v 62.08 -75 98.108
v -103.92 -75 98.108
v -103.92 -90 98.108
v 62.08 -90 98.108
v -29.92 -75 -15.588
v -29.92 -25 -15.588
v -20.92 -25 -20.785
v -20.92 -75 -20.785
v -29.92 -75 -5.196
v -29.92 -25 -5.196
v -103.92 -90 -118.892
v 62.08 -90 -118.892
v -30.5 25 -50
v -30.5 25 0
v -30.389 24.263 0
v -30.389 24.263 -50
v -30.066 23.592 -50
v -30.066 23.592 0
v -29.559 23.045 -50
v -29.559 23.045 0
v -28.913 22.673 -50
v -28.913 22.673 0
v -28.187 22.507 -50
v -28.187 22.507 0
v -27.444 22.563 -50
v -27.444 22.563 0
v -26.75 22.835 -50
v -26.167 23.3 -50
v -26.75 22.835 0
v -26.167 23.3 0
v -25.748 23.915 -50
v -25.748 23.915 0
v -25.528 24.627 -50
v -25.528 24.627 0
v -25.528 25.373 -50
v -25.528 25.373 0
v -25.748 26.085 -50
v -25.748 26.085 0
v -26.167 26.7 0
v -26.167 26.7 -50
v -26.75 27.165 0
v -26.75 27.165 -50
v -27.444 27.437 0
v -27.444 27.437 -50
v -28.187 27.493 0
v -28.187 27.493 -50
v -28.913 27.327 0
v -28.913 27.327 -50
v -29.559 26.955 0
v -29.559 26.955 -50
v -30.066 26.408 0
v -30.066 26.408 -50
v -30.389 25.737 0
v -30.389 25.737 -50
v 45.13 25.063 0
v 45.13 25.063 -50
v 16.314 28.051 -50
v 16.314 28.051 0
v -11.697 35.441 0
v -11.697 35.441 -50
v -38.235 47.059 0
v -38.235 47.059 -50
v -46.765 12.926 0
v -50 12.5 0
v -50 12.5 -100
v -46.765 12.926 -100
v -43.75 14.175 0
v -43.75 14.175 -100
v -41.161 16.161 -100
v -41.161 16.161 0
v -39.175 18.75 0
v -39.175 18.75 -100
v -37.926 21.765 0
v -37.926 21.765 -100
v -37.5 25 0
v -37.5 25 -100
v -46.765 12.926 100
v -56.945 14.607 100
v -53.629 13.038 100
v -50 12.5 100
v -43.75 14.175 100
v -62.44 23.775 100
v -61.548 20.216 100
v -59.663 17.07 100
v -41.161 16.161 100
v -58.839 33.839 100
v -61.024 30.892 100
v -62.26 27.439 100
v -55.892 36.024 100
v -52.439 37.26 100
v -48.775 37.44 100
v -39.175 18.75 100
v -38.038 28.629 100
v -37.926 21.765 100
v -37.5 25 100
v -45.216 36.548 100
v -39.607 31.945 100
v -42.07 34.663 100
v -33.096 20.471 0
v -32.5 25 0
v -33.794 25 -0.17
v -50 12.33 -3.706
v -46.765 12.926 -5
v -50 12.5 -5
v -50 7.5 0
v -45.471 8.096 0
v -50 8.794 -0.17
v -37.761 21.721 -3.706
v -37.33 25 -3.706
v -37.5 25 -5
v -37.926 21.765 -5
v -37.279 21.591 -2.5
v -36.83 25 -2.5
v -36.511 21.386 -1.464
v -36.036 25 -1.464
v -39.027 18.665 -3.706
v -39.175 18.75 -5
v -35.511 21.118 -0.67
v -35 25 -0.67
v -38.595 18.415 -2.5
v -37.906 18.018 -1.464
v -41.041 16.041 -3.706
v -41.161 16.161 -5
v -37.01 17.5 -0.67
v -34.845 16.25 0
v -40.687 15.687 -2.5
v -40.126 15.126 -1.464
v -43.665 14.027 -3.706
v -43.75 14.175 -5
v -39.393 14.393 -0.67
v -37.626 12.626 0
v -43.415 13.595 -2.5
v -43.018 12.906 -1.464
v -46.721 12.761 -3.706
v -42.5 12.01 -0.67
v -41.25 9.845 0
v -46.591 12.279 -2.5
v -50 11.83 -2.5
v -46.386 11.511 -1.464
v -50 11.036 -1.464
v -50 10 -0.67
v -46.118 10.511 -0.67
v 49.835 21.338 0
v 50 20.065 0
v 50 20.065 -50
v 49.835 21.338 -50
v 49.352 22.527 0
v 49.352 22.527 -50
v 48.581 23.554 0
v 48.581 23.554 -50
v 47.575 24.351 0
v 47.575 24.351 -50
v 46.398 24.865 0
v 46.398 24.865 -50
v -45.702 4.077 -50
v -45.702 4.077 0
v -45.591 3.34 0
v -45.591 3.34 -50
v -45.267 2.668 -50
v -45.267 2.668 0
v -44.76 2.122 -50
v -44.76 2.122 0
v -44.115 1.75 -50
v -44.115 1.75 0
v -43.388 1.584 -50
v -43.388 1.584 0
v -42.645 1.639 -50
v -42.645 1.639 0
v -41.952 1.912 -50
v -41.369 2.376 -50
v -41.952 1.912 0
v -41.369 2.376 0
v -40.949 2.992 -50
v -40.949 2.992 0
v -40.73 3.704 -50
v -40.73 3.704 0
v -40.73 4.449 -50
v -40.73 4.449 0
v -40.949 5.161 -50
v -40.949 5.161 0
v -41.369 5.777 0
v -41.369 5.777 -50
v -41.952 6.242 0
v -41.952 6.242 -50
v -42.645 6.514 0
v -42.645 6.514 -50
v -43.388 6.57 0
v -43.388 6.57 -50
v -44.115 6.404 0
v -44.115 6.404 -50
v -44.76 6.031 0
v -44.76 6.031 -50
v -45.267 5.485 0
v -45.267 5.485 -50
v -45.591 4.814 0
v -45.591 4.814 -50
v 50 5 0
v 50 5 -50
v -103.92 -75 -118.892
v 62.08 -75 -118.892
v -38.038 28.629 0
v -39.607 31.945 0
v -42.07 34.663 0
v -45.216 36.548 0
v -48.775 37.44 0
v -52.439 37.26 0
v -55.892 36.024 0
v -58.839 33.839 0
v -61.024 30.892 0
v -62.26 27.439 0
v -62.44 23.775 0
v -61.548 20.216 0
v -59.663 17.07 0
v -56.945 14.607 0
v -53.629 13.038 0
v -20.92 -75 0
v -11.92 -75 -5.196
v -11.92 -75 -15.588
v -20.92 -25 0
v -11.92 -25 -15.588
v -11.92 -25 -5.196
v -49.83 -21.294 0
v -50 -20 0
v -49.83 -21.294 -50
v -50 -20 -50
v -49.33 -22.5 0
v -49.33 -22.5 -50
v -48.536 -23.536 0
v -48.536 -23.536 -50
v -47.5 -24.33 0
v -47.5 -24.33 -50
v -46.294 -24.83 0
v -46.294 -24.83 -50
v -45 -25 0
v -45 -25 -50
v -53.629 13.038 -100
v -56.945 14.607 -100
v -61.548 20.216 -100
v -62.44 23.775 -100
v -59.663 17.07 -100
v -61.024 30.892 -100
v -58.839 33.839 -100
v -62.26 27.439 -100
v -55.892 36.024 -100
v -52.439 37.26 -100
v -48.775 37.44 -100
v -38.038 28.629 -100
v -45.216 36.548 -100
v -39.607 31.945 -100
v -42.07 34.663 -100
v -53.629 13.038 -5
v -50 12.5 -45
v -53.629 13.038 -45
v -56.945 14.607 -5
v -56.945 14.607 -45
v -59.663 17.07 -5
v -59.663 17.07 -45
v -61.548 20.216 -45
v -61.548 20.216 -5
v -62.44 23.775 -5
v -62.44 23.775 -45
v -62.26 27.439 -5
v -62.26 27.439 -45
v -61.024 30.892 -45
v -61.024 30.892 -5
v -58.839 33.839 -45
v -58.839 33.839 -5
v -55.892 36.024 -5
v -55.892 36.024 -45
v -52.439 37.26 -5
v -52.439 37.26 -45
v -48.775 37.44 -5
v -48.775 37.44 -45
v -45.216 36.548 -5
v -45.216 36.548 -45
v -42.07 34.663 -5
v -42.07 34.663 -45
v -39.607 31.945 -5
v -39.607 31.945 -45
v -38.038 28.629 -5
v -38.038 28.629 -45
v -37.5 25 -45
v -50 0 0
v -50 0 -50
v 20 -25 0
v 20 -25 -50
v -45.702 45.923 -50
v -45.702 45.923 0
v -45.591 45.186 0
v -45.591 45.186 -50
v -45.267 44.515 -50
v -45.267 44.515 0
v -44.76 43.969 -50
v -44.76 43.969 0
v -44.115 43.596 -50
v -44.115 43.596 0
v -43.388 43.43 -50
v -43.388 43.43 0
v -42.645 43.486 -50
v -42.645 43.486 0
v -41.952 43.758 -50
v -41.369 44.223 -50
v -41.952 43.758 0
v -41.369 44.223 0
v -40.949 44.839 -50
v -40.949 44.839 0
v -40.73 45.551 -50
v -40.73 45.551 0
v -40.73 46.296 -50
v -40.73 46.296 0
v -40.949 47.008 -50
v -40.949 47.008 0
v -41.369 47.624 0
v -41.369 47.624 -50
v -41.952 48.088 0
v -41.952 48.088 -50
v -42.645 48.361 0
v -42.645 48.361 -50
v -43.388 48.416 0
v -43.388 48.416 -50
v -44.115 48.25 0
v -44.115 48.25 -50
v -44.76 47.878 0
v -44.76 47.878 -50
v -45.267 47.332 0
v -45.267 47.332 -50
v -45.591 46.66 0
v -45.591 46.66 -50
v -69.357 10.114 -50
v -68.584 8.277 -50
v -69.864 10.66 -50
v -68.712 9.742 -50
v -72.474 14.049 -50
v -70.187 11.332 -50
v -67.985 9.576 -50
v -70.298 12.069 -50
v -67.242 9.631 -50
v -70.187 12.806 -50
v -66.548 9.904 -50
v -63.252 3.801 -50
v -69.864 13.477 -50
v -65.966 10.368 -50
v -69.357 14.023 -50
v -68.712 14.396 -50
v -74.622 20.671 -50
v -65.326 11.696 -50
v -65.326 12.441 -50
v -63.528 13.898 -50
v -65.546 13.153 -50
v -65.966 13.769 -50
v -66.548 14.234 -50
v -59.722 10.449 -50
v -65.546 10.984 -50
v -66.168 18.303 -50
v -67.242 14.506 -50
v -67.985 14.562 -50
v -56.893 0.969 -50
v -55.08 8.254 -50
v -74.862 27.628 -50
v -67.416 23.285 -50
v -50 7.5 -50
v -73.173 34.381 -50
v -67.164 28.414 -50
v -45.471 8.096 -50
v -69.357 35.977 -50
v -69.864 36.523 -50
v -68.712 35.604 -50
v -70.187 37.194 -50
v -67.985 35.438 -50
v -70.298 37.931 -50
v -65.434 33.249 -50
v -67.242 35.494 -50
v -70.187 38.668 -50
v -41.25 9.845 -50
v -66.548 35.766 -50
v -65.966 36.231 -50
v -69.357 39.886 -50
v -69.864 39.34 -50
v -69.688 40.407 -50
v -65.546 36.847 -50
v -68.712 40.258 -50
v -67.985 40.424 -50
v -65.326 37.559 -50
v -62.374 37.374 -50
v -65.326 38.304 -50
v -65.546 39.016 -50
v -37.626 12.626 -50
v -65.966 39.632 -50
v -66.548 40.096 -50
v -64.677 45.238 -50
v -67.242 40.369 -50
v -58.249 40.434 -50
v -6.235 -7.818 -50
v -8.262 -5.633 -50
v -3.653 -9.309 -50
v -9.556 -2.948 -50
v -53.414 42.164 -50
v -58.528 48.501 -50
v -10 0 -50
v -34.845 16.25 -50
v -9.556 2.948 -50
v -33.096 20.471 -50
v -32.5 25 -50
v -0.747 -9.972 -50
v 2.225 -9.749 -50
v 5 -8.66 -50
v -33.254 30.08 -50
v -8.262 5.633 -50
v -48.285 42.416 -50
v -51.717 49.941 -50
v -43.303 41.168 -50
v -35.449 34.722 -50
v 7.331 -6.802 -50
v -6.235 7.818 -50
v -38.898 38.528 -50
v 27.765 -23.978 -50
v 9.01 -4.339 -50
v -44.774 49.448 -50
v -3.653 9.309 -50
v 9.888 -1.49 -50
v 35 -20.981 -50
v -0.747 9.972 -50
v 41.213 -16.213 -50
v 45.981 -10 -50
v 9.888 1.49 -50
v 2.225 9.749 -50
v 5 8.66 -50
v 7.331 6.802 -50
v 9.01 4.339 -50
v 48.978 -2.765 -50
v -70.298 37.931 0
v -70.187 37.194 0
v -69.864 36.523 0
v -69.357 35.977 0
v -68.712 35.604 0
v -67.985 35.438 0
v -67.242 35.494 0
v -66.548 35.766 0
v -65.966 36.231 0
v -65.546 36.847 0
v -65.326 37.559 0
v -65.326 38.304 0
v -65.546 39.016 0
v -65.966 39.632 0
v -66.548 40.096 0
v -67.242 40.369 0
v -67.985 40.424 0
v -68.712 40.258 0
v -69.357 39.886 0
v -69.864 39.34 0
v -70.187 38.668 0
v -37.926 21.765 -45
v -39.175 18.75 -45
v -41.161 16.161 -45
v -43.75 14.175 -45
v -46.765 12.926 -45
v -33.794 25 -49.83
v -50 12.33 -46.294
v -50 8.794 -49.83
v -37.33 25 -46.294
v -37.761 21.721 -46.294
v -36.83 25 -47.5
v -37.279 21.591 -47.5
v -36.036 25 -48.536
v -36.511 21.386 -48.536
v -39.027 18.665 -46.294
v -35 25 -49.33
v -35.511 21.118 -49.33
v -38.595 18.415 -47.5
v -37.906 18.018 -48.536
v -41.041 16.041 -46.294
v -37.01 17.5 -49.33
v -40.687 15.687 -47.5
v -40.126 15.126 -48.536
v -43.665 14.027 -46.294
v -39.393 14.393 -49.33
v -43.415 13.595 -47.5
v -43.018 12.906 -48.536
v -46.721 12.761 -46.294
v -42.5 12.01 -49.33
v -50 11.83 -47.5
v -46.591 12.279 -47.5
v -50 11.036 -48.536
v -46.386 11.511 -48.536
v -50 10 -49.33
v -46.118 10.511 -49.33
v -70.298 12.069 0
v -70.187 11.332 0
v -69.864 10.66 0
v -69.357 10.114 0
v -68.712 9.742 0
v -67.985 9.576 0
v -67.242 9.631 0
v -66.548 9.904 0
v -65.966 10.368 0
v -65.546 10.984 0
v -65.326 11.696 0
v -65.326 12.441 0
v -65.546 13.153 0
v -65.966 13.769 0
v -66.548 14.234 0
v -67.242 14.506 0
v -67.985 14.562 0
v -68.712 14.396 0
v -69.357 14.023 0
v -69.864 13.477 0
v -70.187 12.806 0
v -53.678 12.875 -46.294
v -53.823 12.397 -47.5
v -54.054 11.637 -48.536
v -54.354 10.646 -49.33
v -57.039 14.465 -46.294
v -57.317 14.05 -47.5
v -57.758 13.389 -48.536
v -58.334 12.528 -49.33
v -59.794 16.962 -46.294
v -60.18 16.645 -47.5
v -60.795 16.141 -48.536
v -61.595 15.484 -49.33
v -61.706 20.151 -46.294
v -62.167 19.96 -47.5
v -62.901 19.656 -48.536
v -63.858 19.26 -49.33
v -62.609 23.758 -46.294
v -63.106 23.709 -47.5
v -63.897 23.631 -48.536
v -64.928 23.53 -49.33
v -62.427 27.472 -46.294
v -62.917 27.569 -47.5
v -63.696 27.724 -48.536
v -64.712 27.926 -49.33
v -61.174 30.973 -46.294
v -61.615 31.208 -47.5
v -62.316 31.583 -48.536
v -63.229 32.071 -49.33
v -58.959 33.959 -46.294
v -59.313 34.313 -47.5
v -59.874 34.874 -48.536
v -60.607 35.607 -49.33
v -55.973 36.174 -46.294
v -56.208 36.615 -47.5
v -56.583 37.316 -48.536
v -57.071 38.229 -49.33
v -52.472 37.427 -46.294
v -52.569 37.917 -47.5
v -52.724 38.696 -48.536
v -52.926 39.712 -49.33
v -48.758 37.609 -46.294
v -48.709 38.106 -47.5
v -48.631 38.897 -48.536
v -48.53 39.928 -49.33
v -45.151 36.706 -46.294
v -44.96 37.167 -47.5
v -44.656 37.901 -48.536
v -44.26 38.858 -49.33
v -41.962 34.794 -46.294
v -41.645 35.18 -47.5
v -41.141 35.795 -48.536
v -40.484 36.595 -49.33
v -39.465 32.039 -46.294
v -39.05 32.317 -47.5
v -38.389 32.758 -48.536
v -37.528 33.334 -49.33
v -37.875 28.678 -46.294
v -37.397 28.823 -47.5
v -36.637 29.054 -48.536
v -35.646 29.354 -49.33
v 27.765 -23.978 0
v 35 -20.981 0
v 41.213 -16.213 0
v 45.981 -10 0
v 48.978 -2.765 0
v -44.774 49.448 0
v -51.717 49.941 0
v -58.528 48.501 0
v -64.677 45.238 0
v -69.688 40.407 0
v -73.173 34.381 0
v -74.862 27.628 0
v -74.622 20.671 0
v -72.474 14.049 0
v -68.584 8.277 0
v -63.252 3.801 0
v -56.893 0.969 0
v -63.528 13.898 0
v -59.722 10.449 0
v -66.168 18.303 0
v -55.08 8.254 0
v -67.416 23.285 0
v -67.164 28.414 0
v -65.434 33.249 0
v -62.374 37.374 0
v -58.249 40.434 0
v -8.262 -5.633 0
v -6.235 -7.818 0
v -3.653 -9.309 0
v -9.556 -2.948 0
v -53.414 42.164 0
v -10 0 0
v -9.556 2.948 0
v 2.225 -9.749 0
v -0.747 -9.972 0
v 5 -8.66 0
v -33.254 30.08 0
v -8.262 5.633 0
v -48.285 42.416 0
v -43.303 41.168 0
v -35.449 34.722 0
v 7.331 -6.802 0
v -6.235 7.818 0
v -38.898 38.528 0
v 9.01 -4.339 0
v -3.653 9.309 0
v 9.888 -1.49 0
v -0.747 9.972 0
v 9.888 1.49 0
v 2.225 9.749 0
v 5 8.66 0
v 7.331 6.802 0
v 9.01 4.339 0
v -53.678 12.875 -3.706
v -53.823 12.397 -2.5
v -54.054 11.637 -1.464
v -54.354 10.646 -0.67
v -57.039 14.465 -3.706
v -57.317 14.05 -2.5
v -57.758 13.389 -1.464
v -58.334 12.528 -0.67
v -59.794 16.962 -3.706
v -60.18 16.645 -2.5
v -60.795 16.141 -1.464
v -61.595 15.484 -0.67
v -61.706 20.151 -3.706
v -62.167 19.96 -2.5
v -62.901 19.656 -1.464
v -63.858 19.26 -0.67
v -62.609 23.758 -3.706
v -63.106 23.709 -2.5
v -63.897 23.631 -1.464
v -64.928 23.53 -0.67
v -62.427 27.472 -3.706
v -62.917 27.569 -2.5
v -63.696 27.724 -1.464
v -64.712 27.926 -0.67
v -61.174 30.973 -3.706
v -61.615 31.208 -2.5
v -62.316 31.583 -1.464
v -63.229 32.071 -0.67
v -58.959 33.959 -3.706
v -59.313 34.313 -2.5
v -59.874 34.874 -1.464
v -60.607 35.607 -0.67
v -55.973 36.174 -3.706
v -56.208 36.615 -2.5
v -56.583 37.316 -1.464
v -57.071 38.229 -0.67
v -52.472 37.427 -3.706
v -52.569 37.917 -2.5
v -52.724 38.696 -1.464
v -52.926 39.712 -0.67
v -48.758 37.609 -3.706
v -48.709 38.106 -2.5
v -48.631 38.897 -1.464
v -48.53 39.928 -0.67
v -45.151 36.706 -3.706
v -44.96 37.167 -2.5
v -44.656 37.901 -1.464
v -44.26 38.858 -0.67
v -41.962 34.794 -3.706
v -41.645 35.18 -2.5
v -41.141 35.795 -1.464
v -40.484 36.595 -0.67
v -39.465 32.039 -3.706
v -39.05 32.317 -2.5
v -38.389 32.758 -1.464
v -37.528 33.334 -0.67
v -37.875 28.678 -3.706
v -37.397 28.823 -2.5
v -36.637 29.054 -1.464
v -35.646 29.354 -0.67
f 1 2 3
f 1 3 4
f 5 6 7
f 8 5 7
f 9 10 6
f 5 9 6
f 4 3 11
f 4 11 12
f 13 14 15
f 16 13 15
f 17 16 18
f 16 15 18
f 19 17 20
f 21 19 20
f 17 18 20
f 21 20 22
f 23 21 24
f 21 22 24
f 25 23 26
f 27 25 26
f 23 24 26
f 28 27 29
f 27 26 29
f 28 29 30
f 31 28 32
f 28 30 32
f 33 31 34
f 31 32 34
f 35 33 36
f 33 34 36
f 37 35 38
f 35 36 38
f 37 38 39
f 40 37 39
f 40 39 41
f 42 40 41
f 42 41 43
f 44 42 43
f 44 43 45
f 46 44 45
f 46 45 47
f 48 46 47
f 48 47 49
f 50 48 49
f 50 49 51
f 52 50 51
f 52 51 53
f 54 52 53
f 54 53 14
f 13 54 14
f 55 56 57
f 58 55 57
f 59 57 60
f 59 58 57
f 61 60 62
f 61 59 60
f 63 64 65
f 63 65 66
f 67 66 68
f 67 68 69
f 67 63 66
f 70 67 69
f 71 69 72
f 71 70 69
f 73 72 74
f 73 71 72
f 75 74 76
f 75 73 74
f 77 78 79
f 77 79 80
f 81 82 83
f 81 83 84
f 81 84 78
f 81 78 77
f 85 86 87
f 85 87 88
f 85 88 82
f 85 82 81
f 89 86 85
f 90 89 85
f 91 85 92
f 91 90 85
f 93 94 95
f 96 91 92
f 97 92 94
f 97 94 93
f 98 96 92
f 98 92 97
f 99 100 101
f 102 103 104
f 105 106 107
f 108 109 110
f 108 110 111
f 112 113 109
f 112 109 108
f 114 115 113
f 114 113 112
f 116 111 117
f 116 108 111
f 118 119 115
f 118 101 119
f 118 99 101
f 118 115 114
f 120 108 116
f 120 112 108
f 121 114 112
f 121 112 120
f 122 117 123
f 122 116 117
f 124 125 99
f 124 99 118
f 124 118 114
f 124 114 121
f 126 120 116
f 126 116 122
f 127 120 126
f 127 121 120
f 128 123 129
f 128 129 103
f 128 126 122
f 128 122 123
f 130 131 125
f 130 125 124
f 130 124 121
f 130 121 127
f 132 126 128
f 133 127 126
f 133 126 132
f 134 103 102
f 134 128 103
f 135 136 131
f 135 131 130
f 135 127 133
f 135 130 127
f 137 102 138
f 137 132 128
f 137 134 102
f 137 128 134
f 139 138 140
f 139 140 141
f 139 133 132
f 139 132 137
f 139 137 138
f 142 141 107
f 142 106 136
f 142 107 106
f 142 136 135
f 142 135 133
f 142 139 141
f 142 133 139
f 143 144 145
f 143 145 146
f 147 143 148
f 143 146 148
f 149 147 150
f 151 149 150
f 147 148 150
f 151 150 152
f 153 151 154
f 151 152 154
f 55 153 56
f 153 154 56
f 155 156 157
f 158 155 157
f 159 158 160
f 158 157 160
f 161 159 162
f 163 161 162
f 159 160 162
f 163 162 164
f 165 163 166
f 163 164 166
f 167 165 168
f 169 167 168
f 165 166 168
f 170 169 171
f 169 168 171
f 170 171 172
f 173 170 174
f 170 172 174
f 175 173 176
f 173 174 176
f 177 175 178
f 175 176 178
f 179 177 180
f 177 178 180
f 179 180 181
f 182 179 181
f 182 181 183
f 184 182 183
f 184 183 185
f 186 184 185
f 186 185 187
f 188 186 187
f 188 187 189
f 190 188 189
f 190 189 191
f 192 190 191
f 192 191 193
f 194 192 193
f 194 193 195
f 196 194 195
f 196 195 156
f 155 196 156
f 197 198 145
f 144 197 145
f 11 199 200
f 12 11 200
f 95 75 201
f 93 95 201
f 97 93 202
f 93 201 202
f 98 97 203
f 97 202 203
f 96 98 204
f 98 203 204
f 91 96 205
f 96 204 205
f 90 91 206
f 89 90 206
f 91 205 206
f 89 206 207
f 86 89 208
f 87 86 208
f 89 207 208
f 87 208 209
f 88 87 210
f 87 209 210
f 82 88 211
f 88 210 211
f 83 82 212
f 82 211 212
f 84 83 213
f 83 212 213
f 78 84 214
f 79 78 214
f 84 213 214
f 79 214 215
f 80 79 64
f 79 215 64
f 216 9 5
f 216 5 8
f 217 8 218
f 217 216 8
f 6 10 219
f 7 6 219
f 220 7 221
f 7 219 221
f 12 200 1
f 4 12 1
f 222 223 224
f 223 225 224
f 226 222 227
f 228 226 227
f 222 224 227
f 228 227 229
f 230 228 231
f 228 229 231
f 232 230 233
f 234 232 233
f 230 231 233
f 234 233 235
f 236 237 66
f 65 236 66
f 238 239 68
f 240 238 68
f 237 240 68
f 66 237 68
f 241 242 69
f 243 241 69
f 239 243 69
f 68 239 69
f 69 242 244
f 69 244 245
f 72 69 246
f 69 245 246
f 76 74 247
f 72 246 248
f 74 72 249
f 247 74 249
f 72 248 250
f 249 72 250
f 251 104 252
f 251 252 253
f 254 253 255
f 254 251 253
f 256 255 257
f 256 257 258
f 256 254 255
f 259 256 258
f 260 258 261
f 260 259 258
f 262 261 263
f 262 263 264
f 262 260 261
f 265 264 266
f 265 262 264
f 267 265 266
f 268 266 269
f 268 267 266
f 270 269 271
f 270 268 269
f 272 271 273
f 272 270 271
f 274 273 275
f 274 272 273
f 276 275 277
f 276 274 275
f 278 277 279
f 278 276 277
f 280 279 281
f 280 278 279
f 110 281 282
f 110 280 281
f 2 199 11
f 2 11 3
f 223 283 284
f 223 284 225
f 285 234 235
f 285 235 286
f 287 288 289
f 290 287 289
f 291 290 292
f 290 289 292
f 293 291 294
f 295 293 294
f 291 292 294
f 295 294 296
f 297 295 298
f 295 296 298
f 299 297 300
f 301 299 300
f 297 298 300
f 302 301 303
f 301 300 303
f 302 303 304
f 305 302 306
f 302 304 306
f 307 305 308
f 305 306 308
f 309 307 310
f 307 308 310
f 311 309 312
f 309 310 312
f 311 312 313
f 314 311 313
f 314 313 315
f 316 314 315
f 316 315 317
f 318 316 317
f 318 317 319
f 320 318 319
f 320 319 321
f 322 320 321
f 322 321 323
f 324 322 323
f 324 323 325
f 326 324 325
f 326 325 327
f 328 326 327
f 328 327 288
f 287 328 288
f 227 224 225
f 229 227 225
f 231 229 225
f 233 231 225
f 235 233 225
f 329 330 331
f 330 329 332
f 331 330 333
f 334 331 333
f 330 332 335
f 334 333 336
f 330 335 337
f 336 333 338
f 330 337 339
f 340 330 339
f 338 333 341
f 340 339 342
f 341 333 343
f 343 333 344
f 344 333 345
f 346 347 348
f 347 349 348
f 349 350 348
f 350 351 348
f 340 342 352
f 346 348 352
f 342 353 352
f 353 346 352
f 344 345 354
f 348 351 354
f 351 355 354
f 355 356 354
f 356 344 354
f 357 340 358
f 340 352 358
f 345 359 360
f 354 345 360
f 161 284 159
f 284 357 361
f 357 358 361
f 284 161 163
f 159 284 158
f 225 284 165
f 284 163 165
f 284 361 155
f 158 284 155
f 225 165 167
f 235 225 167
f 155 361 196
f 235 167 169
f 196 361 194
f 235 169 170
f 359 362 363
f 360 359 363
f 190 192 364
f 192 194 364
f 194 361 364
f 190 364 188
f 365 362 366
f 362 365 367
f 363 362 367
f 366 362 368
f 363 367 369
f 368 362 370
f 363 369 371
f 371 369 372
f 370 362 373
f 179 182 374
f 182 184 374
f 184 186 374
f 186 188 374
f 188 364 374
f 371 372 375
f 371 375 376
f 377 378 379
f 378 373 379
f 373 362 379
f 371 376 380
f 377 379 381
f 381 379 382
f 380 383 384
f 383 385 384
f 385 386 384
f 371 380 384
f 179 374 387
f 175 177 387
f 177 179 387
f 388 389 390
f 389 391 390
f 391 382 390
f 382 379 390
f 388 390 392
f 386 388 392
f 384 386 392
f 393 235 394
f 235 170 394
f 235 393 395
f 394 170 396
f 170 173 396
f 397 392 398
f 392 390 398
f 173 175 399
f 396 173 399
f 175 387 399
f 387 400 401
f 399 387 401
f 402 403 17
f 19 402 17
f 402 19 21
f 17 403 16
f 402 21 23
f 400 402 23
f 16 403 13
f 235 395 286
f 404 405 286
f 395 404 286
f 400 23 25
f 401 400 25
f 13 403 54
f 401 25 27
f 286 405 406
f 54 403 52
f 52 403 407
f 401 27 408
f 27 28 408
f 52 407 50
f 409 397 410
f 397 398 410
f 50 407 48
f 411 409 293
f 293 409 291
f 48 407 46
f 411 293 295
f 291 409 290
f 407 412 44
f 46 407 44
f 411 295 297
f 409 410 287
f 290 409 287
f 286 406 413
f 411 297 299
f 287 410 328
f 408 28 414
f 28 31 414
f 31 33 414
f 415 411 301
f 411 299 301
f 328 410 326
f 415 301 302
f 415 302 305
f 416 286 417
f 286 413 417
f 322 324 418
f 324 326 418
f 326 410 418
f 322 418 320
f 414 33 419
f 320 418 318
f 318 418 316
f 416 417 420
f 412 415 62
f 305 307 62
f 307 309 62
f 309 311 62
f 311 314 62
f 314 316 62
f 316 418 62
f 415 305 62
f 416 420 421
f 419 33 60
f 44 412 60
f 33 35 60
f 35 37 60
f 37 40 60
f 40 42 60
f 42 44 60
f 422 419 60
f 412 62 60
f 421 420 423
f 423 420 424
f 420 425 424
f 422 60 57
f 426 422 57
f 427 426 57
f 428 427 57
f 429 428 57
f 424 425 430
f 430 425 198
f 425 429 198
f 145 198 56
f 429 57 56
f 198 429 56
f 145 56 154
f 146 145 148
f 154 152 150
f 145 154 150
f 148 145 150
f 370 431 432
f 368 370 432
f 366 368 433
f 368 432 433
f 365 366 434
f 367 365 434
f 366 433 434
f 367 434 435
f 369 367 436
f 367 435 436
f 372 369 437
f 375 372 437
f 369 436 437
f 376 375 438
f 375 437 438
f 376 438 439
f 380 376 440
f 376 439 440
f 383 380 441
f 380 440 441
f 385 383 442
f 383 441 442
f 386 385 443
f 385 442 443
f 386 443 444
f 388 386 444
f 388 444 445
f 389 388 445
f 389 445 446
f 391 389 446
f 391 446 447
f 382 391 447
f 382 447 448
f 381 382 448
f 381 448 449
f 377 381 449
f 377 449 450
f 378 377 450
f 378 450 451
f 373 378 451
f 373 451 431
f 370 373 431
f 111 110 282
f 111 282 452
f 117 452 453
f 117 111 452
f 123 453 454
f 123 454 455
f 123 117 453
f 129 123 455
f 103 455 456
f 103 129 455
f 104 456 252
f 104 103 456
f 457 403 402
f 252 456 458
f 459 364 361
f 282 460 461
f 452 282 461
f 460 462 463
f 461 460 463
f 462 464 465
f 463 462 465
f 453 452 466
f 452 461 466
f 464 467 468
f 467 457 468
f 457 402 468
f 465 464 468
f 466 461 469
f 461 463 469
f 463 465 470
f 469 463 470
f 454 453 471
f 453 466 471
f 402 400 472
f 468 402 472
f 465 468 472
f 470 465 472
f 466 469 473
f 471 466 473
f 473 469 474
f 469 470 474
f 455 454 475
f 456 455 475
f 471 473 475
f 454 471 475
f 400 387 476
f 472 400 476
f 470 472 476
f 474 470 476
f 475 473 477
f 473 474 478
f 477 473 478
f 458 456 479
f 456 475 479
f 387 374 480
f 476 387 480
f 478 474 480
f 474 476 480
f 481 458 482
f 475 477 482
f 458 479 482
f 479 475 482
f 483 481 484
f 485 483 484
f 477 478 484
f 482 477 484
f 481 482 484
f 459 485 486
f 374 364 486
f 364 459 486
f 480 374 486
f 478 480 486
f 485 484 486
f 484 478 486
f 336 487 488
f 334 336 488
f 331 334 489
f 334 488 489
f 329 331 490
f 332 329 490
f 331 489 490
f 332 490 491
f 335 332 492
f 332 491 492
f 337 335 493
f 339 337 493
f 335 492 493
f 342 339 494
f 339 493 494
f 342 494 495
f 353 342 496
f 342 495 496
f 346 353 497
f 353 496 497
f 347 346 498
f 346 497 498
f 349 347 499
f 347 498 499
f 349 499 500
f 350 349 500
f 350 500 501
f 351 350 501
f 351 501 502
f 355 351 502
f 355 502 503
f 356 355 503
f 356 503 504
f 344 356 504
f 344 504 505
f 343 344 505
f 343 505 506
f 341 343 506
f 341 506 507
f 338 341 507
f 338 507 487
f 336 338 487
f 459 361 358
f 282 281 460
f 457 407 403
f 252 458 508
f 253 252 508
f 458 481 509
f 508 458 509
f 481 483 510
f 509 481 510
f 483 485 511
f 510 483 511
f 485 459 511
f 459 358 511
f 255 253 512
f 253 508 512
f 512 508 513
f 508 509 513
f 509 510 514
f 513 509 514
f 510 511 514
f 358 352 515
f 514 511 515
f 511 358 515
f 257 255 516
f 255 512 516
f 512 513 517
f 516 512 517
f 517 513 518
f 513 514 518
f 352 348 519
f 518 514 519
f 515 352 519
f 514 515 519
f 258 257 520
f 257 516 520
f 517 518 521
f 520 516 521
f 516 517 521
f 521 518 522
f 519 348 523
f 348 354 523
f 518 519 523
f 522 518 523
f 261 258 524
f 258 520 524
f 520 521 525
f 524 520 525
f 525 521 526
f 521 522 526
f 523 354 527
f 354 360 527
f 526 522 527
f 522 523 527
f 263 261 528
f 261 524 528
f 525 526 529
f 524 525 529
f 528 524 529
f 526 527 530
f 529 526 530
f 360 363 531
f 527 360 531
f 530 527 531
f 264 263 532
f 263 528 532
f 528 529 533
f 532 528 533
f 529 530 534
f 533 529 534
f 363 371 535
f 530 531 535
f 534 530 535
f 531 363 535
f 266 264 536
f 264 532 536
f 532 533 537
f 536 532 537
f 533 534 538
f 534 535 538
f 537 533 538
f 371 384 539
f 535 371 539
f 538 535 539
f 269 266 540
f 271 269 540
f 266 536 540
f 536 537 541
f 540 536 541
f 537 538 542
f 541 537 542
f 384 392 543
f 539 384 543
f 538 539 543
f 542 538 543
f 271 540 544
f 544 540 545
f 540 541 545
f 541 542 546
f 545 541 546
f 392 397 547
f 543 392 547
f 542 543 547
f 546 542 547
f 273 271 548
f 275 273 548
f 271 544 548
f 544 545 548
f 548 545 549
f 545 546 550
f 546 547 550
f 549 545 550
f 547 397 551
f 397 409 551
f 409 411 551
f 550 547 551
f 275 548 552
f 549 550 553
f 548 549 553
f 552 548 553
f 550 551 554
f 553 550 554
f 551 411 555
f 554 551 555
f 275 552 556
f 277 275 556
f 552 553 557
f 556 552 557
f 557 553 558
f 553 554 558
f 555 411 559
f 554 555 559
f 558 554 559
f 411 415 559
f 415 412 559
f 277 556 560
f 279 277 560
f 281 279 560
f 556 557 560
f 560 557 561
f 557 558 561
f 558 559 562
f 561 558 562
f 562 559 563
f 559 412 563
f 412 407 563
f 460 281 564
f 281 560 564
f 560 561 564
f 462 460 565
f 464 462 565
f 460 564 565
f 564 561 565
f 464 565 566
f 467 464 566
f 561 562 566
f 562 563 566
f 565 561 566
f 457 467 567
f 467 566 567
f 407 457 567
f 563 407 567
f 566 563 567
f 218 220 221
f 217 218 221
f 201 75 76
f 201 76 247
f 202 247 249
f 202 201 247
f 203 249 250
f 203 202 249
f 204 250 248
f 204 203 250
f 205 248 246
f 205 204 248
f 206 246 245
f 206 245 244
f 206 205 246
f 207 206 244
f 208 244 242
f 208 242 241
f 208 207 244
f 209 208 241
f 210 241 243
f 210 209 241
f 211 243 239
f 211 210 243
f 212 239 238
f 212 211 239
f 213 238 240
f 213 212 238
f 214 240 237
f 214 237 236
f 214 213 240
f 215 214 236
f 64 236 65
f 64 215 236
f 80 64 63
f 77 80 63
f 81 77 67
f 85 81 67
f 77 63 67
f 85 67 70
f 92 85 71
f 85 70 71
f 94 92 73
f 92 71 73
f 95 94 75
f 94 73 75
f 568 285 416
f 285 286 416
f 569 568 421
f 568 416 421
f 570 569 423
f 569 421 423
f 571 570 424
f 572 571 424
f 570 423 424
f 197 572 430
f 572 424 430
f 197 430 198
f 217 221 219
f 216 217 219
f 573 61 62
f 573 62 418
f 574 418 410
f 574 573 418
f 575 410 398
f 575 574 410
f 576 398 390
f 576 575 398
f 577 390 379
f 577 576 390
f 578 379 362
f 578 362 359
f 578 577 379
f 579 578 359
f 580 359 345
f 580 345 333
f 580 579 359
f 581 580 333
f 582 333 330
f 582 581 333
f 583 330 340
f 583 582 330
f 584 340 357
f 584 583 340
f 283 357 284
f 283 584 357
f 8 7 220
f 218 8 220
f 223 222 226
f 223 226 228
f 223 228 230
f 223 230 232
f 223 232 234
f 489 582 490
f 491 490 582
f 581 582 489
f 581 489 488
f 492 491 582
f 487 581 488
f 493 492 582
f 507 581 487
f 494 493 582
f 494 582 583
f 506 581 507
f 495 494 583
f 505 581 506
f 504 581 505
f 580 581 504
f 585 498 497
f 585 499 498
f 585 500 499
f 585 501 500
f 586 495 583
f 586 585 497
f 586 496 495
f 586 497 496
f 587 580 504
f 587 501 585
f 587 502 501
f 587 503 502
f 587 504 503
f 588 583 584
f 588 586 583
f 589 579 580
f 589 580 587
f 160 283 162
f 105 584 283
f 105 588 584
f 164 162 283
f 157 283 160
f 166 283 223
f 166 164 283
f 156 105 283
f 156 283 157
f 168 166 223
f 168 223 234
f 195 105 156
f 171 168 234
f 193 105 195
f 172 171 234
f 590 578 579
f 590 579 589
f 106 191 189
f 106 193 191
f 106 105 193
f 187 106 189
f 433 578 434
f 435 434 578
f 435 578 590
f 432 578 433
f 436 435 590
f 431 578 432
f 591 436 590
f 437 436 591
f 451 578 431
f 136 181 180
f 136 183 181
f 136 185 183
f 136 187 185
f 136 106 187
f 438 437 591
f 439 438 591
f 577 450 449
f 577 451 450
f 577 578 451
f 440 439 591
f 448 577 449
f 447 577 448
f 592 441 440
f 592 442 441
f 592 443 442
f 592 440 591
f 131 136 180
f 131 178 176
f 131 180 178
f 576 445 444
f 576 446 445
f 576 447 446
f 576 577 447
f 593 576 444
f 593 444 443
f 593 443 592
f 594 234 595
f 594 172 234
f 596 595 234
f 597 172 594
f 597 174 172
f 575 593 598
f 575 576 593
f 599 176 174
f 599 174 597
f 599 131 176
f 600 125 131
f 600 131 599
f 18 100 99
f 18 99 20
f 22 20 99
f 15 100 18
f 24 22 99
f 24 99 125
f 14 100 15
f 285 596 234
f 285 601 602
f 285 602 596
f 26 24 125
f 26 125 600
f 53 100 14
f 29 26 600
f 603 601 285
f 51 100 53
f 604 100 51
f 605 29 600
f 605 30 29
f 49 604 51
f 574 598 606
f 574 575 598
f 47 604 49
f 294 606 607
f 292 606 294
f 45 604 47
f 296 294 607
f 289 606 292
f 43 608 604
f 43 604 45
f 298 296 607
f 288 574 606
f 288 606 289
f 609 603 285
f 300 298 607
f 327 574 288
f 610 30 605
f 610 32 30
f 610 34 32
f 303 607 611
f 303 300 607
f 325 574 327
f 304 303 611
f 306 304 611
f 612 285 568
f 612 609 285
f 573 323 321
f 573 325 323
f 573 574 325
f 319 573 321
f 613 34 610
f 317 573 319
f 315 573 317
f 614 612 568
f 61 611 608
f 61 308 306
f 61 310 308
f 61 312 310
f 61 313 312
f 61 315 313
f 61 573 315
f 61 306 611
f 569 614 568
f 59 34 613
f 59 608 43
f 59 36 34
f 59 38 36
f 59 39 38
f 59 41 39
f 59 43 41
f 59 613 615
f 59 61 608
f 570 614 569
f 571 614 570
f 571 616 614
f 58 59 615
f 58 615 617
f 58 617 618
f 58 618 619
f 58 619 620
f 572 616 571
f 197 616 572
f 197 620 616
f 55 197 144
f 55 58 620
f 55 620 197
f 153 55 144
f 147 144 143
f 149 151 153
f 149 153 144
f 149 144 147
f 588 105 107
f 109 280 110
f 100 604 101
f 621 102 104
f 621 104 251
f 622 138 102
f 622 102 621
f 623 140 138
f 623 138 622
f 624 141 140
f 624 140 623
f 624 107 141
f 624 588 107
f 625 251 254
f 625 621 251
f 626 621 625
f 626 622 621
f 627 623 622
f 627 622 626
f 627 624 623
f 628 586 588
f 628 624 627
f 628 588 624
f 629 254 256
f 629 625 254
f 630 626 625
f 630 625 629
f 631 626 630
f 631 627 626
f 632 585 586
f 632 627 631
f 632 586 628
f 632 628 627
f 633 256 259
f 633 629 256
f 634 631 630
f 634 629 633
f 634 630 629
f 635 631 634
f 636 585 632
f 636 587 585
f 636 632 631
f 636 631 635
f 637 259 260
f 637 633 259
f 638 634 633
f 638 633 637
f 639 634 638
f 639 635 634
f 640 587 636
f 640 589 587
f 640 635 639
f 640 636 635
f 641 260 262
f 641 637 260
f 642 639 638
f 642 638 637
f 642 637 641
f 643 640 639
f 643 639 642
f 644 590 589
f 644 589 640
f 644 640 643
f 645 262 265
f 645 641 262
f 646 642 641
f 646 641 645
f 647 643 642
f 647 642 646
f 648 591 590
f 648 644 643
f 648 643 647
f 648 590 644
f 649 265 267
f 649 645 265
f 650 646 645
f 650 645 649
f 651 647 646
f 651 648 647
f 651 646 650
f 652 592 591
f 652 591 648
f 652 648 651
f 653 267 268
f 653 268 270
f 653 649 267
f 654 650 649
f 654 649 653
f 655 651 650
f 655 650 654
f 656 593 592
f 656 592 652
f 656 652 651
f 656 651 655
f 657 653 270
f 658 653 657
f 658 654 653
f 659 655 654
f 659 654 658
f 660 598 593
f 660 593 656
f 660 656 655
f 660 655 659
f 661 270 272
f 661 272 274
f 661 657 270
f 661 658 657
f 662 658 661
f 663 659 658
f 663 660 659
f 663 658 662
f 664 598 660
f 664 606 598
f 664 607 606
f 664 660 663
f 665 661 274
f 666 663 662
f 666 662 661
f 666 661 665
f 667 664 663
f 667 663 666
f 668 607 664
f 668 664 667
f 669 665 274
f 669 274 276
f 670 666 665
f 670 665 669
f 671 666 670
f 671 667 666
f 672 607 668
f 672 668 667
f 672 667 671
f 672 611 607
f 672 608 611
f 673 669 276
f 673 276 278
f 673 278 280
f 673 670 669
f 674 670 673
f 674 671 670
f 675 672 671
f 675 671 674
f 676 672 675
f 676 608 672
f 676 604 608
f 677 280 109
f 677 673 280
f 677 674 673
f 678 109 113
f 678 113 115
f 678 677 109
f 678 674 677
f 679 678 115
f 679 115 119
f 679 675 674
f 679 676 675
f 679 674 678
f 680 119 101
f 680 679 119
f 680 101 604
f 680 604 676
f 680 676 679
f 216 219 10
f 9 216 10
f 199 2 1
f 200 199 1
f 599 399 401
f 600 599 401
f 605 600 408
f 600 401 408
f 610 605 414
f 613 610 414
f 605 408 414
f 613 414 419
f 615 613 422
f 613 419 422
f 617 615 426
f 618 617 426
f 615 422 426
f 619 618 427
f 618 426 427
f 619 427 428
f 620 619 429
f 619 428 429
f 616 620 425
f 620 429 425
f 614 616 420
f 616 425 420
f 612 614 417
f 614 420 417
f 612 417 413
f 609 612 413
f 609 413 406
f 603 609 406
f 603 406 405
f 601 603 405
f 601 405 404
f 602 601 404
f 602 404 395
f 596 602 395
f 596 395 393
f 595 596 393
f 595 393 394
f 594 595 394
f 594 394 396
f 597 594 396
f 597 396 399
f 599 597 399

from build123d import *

# Parameters (mm, degrees)
F1_DEPTH  = 50
F2_DEPTH  = 100
F3_R      = 5
F4_R      = 5
F5_D      = 20
F7_D      = 5
F8_R      = 30
F10_DEPTH = 50
F11_W     = 166
F11_H     = 217
F12_DEPTH = 15


with BuildPart() as f1:
    # F0 (on Top) → F1 (new body)
    with BuildSketch(Plane.XY):
        with BuildLine():
            Line((-25, 25), (50, 25))
            ThreePointArc((50, 25), (4.5245703057, 30.5982812227), (-38.2352941176, 47.0588235294))
            ThreePointArc((-38.2352941176, 47.0588235294), (-28.5626768572, 37.8623938857), (-25, 25))
        make_face()
        with BuildLine():
            Line((-50, 0), (-50, -25))
            Line((-50, -25), (50, -25))
            Line((50, -25), (50, 25))
            Line((50, 25), (-25, 25))
            ThreePointArc((-25, 25), (-32.3223304703, 7.3223304703), (-50, 0))
        make_face()
        with BuildLine():
            ThreePointArc((-38.2352941176, 47.0588235294), (-74.2535625036, 31.0633906259), (-50, 0))
            Line((-50, 0), (-50, 12.5))
            ThreePointArc((-50, 12.5), (-58.8388347648, 33.8388347648), (-37.5, 25))
            Line((-37.5, 25), (-25, 25))
            ThreePointArc((-25, 25), (-28.5626768572, 37.8623938857), (-38.2352941176, 47.0588235294))
        make_face()
        with BuildLine():
            Line((-50, 12.5), (-50, 0))
            ThreePointArc((-50, 0), (-32.3223304703, 7.3223304703), (-25, 25))
            Line((-25, 25), (-37.5, 25))
            ThreePointArc((-37.5, 25), (-41.1611652352, 16.1611652352), (-50, 12.5))
        make_face()
    extrude(amount=-F1_DEPTH)

    # F3
    f3_edges = [f1.edges().sort_by_distance(p)[0] for p in [
        (-37.5, 25, -25),
        (-62.5, 25, 0),
        (-62.5, 25, -50),
    ]]
    fillet(f3_edges, radius=F3_R)

    # F4
    f4_edges = [f1.edges().sort_by_distance(p)[0] for p in [
        (-50, -25, -25),
        (50, 25, -25),
    ]]
    fillet(f4_edges, radius=F4_R)

    # F5 (through all)
    with Locations(Plane.XY):
        with Locations((0, 0)):
            Hole(F5_D / 2)

    # F7 (through all)
    with Locations(Plane(origin=(0, 0, -50), x_dir=(1, 0, 0), z_dir=(0, 0, -1))):
        with Locations((-43.2016261238, -45.9232433585), (-67.7983738762, -37.9312755504), (-67.7983738762, -12.0687244496), (-43.2016261238, -4.0767566415), (-28, -25)):
            Hole(F7_D / 2)

    # F8
    f8_edges = [f1.edges().sort_by_distance(p)[0] for p in [
        (50, -25, -25),
    ]]
    fillet(f8_edges, radius=F8_R)


with BuildPart() as f2:
    # F0 (on Top) → F2 (new body, symmetric)
    with BuildSketch(Plane.XY):
        with BuildLine():
            ThreePointArc((-37.5, 25), (-58.8388347648, 33.8388347648), (-50, 12.5))
            Line((-50, 12.5), (-50, 25))
            Line((-50, 25), (-37.5, 25))
        make_face()
        with BuildLine():
            Line((-50, 25), (-50, 12.5))
            ThreePointArc((-50, 12.5), (-41.1611652352, 16.1611652352), (-37.5, 25))
            Line((-37.5, 25), (-50, 25))
        make_face()
    extrude(amount=F2_DEPTH, both=True)


with BuildPart() as f10:
    # F9 (on face) → F10 (new body)
    with BuildSketch(Plane.XZ.offset(25)):
        Polygon((-11.9197796978, -15.5884572681), (-11.9197796978, -5.1961524227), (-20.9197796978, 0), (-29.9197796978, -5.1961524227), (-29.9197796978, -15.5884572681), (-20.9197796978, -20.7846096908), align=None)
    extrude(amount=F10_DEPTH)


with BuildPart() as f12:
    # F11 (on face) → F12 (new body)
    with BuildSketch(Plane.XZ.offset(75)):
        with Locations((-20.9197796978, -10.3923048454)):
            Rectangle(F11_W, F11_H)
        Polygon((-11.9197796978, -15.5884572681), (-20.9197796978, -20.7846096908), (-29.9197796978, -15.5884572681), (-29.9197796978, -5.1961524227), (-20.9197796978, 0), (-11.9197796978, -5.1961524227), align=None, mode=Mode.SUBTRACT)
        Polygon((-29.9197796978, -15.5884572681), (-20.9197796978, -20.7846096908), (-11.9197796978, -15.5884572681), (-11.9197796978, -5.1961524227), (-20.9197796978, 0), (-29.9197796978, -5.1961524227), align=None)
    extrude(amount=F12_DEPTH)


solid = Compound([f1.part, f2.part, f10.part, f12.part])
